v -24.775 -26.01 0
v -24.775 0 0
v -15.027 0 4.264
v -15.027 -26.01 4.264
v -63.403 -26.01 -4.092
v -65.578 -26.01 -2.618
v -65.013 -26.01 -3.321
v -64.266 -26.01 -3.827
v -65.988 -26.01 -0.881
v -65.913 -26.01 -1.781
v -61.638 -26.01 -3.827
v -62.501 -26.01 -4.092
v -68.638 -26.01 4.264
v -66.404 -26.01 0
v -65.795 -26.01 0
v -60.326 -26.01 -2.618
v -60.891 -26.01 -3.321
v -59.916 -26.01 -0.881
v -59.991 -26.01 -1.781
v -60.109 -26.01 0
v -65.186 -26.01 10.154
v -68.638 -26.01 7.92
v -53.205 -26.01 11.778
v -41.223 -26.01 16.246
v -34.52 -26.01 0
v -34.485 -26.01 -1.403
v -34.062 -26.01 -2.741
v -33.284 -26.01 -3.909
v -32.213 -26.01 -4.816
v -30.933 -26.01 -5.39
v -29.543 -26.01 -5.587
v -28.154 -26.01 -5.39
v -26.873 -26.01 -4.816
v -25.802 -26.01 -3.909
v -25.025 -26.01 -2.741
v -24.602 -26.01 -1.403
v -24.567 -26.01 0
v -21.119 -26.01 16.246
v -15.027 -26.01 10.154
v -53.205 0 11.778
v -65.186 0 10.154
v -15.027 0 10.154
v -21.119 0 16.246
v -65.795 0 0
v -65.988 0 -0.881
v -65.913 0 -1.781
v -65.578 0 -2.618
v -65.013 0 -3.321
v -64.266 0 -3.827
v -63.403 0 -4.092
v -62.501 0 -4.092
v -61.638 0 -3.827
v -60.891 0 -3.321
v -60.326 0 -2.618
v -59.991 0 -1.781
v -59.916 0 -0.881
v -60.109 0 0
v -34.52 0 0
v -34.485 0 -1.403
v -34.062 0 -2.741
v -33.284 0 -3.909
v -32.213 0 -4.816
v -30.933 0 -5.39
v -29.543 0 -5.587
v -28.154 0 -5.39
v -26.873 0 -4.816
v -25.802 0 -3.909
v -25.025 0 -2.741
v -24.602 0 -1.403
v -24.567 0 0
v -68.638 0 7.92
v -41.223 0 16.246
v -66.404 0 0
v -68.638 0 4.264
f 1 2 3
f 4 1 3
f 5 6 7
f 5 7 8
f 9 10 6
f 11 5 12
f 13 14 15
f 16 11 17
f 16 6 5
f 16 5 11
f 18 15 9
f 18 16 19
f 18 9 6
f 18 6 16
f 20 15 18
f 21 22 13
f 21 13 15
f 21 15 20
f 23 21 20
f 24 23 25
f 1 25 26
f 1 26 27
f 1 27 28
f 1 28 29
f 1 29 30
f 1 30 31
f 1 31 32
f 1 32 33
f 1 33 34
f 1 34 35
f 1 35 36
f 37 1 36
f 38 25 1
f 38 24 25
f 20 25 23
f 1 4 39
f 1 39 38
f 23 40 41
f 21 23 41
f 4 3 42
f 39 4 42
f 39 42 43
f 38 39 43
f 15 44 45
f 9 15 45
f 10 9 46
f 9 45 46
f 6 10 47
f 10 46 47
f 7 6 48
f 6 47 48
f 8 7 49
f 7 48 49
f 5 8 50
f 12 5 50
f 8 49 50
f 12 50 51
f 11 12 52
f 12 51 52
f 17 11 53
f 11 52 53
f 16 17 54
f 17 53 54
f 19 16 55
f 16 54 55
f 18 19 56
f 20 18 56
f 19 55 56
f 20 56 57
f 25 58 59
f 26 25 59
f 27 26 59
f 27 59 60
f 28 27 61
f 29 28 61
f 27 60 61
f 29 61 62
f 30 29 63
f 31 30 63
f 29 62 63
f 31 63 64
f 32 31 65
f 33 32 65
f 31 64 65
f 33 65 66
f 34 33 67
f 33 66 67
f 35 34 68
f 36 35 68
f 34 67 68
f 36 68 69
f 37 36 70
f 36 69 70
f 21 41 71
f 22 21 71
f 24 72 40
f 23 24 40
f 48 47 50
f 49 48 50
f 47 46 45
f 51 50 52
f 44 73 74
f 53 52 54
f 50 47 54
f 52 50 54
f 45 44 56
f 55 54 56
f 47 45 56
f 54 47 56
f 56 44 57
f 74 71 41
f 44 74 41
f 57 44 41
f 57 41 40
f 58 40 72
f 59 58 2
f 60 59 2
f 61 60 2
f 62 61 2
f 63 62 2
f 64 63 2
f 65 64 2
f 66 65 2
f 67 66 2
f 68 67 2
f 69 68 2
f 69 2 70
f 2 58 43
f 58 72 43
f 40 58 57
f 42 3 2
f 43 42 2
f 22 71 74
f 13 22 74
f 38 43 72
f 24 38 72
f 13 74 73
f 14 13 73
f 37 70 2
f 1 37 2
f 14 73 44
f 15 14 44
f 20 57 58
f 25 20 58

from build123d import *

# Parameters (mm, degrees)
F4_DEPTH = 26.0096


with BuildPart() as f4:
    # F3 (on Front) → F4 (new body)
    with BuildSketch(Plane.XZ):
        with BuildLine():
            Line((-15.027259, 4.264493), (-15.027259, 10.153553))
            Line((-15.027259, 10.153553), (-21.119392, 16.245686))
            Line((-21.119392, 16.245686), (-41.223429, 16.245686))
            Line((-41.223429, 16.245686), (-53.204622, 11.778122))
            Line((-53.204622, 11.778122), (-65.185815, 10.153553))
            Line((-65.185815, 10.153553), (-68.638019, 7.919772))
            Line((-68.638019, 7.919772), (-68.638019, 4.264493))
            Line((-68.638019, 4.264493), (-66.404238, 0))
            Line((-66.404238, 0), (-65.795027, 0))
            ThreePointArc((-65.795027, 0), (-62.952032, -4.125348), (-60.109038, 0))
            Line((-60.109038, 0), (-34.520175, 0))
            ThreePointArc((-34.520175, 0), (-29.543368, -5.586779), (-24.566561, 0))
            Line((-24.566561, 0), (-24.774671, 0))
            Line((-24.774671, 0), (-15.027259, 4.264493))
        make_face()
    extrude(amount=F4_DEPTH)


solid = f4.part
